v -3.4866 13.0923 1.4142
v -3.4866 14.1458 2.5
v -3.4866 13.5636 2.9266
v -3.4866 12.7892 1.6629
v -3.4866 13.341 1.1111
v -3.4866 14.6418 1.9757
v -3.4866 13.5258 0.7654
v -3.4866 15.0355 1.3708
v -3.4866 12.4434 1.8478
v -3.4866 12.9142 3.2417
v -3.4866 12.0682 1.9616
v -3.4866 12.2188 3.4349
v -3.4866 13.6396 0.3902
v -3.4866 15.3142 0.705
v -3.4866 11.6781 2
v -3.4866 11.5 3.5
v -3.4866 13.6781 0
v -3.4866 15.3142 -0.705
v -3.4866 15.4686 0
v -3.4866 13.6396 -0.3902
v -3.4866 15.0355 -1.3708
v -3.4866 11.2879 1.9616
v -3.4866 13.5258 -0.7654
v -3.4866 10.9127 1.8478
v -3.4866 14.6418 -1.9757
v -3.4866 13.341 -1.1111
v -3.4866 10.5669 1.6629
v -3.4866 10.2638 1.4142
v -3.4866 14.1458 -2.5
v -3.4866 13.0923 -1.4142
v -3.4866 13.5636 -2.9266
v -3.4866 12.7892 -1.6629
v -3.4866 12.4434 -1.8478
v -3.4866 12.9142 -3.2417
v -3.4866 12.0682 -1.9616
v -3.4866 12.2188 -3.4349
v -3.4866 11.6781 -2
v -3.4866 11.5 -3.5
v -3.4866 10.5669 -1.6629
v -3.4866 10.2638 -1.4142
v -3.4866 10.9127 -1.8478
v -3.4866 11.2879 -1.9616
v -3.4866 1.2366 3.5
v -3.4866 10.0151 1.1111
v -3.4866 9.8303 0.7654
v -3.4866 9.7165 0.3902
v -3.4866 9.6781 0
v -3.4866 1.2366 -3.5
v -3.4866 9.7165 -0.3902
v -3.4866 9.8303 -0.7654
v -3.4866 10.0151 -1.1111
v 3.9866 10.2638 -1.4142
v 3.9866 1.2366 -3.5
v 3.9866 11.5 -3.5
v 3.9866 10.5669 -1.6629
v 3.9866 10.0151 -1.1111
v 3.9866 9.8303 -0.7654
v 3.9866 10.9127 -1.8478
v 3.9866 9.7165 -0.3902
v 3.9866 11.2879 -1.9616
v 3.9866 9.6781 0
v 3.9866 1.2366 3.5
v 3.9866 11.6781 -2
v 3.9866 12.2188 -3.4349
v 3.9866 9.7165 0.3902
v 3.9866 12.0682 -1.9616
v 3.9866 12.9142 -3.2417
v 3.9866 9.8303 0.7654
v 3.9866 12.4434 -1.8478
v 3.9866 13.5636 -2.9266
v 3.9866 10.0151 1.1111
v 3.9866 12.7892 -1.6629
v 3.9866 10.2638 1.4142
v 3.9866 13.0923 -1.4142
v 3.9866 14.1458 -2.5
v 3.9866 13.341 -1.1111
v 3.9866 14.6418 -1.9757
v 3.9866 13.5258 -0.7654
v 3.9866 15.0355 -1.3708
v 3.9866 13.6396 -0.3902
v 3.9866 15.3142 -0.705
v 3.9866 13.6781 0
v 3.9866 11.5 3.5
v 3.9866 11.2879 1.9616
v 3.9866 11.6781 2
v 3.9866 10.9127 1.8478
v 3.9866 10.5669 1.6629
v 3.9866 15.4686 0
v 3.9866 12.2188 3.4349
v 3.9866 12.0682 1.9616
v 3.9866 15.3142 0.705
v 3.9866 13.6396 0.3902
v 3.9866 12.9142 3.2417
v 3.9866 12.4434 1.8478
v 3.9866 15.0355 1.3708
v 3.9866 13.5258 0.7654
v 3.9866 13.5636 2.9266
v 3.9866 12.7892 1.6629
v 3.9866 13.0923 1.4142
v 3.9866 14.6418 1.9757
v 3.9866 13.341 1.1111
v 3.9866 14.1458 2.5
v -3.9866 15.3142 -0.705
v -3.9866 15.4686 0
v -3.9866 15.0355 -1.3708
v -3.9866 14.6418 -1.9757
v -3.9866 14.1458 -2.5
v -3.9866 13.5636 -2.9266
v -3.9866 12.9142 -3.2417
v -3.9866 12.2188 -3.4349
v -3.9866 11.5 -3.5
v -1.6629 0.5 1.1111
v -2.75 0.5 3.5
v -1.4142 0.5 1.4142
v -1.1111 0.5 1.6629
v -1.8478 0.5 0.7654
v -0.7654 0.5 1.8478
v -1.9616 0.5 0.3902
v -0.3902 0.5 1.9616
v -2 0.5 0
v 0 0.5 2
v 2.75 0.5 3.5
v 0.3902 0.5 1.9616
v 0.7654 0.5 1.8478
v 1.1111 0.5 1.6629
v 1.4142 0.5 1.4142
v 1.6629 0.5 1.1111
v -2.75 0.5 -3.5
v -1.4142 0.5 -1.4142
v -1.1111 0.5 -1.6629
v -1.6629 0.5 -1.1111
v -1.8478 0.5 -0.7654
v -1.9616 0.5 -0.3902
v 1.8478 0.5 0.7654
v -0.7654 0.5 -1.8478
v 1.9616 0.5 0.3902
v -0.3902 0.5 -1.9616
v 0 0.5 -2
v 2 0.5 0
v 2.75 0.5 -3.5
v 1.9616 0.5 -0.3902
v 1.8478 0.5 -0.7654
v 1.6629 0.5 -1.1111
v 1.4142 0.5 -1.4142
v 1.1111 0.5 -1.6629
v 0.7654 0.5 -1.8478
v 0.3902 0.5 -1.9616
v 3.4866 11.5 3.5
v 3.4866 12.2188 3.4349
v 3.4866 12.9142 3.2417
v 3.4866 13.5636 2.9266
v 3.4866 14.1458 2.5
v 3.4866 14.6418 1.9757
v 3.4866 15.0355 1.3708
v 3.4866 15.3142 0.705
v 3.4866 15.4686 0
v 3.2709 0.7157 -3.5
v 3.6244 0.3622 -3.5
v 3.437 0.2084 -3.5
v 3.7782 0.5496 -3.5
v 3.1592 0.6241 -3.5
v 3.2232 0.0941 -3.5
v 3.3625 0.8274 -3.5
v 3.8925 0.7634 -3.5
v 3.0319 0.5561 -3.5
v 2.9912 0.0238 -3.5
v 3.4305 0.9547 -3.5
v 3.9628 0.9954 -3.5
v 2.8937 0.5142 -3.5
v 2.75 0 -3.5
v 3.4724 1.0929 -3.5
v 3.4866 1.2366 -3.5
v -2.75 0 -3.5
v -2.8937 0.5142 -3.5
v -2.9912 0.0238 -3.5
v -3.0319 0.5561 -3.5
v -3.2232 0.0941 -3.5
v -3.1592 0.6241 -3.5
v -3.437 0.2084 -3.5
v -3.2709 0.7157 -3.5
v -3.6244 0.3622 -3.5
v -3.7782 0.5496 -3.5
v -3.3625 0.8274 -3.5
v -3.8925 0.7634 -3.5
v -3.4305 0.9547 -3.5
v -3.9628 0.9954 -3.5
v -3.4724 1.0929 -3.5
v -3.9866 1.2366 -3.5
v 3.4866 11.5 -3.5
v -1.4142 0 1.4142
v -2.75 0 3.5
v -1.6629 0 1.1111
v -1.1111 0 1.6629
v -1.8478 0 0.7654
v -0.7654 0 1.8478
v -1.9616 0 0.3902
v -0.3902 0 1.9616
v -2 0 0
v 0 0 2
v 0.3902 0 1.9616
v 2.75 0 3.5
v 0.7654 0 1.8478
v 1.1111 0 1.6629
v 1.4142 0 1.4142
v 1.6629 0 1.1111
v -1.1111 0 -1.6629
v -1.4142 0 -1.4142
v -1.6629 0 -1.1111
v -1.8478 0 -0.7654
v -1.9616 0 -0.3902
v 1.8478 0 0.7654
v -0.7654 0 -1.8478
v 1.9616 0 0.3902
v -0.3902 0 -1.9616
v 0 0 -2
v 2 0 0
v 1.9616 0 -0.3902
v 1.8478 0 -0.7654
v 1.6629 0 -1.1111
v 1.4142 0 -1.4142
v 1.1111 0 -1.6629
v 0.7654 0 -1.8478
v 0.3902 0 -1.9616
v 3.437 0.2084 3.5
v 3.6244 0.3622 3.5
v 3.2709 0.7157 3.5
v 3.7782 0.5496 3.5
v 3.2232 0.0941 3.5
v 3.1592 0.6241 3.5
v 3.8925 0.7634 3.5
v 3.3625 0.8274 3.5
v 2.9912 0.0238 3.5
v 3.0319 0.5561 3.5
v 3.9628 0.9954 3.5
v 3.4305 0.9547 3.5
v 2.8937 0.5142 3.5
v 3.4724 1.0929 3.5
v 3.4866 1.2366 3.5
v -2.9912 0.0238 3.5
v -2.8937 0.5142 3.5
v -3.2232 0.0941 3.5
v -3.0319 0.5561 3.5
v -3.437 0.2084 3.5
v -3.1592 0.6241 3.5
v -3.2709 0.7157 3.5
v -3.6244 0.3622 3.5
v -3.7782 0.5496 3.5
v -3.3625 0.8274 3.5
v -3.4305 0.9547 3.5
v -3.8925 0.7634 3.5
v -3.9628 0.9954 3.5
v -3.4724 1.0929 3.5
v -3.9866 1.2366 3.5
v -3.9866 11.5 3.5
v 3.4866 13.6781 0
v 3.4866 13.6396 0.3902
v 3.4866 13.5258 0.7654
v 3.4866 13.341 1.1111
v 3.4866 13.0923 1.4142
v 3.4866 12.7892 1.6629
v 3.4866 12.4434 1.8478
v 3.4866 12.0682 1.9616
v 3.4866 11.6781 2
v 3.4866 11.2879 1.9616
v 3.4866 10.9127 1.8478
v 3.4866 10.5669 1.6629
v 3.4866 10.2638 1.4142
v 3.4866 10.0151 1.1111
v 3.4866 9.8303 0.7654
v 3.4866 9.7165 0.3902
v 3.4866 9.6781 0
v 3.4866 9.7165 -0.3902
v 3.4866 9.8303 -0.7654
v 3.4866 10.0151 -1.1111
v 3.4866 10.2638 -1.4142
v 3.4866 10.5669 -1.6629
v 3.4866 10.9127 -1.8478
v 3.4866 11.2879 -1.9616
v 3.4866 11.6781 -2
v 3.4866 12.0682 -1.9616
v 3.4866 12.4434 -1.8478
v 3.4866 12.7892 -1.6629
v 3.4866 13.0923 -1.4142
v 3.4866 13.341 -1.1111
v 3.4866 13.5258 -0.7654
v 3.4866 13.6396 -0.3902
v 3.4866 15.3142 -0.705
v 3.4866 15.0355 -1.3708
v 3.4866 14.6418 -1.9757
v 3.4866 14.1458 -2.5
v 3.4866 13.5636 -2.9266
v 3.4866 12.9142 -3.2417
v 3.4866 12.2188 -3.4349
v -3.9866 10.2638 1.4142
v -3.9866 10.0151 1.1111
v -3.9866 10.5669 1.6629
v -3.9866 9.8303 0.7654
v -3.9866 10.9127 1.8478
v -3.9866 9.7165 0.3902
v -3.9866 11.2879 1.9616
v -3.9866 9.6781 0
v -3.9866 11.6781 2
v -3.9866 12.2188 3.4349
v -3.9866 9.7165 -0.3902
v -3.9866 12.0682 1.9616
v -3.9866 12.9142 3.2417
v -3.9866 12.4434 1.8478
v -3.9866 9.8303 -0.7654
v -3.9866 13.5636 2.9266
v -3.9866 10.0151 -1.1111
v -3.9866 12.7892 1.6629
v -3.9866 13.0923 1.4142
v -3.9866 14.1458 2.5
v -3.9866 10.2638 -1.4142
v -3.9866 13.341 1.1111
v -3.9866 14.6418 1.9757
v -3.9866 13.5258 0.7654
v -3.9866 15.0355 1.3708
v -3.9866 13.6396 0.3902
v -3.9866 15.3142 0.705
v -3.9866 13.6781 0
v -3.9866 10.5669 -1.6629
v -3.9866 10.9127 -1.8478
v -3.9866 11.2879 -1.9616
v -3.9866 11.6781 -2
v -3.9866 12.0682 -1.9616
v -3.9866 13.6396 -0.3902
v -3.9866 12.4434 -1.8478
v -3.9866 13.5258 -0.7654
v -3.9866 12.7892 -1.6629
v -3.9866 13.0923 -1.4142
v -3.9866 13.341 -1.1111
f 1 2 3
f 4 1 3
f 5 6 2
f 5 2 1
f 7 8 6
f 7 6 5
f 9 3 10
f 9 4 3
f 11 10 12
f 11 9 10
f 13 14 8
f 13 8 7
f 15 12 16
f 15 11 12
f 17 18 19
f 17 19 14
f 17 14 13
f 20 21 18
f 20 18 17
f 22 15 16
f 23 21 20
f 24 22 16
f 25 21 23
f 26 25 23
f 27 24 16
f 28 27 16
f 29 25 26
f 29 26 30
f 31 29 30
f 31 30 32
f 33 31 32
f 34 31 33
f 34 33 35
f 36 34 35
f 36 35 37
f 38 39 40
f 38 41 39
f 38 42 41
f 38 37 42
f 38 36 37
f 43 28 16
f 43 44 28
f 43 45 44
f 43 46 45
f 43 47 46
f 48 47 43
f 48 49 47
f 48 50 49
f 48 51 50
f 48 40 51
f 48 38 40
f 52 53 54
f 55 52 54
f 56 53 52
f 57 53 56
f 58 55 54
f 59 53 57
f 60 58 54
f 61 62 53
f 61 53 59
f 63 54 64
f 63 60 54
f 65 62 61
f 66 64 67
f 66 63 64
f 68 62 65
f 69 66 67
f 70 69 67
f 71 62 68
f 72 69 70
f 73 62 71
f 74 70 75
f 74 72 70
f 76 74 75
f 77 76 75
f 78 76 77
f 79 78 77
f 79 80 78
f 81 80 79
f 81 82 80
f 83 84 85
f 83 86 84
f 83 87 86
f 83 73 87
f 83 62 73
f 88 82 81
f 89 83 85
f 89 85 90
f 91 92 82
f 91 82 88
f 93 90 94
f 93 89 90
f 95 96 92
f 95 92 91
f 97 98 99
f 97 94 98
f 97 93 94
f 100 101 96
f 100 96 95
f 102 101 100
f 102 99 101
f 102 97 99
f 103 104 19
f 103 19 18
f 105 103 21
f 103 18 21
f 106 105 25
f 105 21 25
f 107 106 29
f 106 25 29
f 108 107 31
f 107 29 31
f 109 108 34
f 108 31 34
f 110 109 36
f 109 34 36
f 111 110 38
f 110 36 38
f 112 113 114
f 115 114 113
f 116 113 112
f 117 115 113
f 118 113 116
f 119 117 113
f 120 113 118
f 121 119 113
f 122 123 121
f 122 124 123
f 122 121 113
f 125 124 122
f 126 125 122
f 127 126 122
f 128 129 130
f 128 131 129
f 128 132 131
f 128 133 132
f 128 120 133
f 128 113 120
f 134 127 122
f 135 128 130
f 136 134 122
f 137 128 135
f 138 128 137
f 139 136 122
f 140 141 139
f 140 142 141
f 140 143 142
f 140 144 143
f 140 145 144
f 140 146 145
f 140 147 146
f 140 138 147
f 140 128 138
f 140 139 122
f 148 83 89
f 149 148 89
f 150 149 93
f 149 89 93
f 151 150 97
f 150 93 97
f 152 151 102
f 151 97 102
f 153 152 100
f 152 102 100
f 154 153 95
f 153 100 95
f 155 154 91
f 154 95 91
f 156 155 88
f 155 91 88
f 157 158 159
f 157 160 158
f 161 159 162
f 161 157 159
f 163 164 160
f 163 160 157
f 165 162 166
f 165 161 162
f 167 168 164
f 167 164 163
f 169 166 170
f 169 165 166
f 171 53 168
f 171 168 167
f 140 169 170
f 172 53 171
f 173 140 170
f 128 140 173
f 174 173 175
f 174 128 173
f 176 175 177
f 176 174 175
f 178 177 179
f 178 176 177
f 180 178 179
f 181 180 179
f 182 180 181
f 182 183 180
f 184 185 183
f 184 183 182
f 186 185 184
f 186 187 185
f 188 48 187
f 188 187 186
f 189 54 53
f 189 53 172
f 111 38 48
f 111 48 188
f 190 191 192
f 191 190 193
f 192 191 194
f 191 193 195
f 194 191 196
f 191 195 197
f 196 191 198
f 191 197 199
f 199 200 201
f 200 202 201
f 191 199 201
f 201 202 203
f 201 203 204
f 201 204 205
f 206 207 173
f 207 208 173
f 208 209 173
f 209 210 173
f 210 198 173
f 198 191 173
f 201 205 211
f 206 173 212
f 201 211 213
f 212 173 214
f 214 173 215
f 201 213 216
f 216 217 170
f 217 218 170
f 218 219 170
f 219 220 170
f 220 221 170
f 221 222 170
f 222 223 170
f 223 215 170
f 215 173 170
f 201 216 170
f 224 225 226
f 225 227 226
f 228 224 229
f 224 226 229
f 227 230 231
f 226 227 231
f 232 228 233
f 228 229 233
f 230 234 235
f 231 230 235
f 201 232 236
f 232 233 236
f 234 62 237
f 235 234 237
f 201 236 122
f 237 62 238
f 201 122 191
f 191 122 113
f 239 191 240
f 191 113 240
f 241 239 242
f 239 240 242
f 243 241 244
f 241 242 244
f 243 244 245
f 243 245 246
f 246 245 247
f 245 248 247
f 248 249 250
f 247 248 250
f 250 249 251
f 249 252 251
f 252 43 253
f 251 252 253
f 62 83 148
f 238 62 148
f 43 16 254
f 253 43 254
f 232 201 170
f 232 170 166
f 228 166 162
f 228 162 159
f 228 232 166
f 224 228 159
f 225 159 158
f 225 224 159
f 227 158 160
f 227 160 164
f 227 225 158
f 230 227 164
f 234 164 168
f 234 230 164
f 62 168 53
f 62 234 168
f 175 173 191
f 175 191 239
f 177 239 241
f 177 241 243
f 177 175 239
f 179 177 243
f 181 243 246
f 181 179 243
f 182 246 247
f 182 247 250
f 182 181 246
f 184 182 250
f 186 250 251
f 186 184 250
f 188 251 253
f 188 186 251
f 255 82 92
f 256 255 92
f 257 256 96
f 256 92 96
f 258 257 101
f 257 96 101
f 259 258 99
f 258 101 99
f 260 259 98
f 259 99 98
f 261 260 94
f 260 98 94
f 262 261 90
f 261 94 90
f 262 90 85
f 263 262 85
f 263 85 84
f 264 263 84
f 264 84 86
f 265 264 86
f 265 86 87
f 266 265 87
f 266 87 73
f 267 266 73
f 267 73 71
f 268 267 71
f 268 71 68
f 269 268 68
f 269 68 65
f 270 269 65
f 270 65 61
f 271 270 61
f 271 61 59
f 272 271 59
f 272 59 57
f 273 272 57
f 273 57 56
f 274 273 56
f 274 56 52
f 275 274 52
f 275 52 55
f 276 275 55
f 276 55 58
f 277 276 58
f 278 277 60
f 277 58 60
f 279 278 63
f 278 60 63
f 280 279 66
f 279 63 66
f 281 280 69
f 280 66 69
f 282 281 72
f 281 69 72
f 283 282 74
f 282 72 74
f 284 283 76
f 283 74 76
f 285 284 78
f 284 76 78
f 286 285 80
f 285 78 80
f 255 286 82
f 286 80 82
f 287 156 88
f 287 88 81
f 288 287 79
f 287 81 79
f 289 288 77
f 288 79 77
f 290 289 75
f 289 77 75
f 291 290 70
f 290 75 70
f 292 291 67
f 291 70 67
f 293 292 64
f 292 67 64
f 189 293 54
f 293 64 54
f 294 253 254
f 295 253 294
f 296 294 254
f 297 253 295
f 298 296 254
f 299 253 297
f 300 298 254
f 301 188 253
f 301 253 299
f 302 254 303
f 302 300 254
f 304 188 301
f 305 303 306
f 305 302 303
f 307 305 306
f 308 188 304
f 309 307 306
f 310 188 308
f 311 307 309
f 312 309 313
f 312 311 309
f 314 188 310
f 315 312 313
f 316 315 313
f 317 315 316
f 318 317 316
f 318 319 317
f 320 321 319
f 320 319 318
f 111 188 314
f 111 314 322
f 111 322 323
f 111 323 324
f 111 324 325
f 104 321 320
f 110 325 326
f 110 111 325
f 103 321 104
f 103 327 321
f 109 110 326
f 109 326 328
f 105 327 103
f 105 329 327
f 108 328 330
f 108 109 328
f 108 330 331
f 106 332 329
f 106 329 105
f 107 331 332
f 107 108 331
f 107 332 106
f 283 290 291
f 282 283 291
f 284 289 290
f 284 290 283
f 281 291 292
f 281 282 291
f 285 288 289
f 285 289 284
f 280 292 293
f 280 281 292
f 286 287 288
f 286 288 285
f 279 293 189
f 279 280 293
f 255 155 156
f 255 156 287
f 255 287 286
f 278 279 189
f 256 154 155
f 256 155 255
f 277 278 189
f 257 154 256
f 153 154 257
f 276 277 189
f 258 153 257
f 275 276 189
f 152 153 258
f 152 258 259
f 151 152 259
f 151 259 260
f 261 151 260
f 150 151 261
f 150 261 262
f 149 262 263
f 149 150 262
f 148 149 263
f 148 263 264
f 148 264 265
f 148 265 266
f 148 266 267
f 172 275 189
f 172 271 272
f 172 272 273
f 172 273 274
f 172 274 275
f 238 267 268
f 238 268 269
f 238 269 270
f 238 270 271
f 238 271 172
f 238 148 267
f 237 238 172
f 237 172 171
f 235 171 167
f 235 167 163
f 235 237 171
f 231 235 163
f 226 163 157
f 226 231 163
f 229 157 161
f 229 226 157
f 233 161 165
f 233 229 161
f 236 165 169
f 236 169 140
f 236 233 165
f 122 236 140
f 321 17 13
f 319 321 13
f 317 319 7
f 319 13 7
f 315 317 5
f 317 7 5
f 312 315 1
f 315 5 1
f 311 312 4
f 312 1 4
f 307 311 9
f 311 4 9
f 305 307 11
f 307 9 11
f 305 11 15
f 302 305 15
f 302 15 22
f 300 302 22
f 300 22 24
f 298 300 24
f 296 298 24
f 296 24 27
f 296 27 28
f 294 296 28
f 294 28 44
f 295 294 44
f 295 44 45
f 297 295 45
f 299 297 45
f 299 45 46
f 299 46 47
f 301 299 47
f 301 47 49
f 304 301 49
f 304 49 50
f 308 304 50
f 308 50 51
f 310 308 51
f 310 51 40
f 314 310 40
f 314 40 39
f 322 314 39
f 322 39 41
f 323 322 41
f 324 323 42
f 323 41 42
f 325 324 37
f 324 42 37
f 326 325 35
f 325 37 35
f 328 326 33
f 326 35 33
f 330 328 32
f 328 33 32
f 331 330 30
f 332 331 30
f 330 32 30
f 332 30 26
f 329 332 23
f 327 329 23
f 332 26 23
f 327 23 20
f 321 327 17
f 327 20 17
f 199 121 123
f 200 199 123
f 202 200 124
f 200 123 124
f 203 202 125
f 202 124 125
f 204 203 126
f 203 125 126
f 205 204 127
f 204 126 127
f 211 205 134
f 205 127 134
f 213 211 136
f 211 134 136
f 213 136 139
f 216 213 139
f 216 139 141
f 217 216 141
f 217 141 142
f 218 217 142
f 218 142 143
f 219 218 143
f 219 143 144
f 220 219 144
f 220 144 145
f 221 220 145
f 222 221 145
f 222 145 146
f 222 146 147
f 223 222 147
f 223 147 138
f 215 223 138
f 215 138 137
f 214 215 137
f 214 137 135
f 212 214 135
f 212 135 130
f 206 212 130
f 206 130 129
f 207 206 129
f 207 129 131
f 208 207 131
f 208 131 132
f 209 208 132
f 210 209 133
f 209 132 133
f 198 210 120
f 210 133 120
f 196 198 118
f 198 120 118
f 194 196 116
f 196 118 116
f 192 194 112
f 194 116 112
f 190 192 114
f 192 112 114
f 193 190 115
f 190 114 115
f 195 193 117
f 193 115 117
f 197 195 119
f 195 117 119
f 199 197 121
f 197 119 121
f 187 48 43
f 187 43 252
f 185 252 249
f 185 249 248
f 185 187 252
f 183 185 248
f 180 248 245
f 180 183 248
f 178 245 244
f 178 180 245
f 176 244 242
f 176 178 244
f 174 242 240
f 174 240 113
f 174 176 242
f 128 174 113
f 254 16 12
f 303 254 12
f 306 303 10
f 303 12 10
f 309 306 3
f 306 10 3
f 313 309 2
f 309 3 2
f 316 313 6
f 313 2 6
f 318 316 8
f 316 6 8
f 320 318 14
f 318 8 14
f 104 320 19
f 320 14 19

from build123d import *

# Parameters (mm, degrees)
SKETCH1_W          = 5.5
SKETCH1_H          = 7
BASE_FLANGE1_DEPTH = 0.5
EDGE_FLANGE1_DEPTH = 7
EDGE_FLANGE2_DEPTH = 7
FILLET1_R          = 4
SKETCH12_R         = 2
CUT_EXTRUDE1_DEPTH = 16.880893326
SKETCH13_R         = 2
CUT_EXTRUDE2_DEPTH = 18.75106584


# Sheet-metal steps are written as plain solids
with BuildPart() as part:
    # Sketch1 → Base-Flange1 (new body)
    with BuildSketch(Plane(origin=(0, 0, 0), x_dir=(1, 0, 0), z_dir=(0, 1, 0))):
        Rectangle(SKETCH1_W, SKETCH1_H)
    extrude(amount=BASE_FLANGE1_DEPTH)

    # Edge-Flange1 section (across the edge) → Edge-Flange1 (add)
    with BuildSketch(Plane(origin=(3.4866, 0.5, 3.5), x_dir=(-1, 0, 0), z_dir=(0, 0, -1))):
        with BuildLine():
            Line((-0.5, 0.7366), (-0.5, 15))
            Line((-0.5, 15), (0, 15))
            Line((0, 15), (0, 0.7366))
            ThreePointArc((0, 0.7366), (0.215745145, 0.215745145), (0.7366, 0))
            Line((0.7366, 0), (0.7366, -0.5))
            ThreePointArc((0.7366, -0.5), (-0.137808246, -0.137808246), (-0.5, 0.7366))
        make_face()
    extrude(amount=EDGE_FLANGE1_DEPTH)

    # Edge-Flange2 section (across the edge) → Edge-Flange2 (add)
    with BuildSketch(Plane(origin=(-3.4866, 0.5, -3.5), x_dir=(1, 0, 0), z_dir=(0, 0, 1))):
        with BuildLine():
            Line((-0.5, 0.7366), (-0.5, 15))
            Line((-0.5, 15), (0, 15))
            Line((0, 15), (0, 0.7366))
            ThreePointArc((0, 0.7366), (0.215745145, 0.215745145), (0.7366, 0))
            Line((0.7366, 0), (0.7366, -0.5))
            ThreePointArc((0.7366, -0.5), (-0.137808246, -0.137808246), (-0.5, 0.7366))
        make_face()
    extrude(amount=EDGE_FLANGE2_DEPTH)

    # Fillet1
    # the kernel refuses this fillet: 4 mm, written as the material it takes off along each edge
    with BuildSketch(Plane(origin=(13.9866, 15.5, -3.5), x_dir=(0, -1, 0), z_dir=(-1, 0, 0)), Plane(origin=(13.9866, 15.5, 3.5), x_dir=(0, 0, -1), z_dir=(-1, 0, 0))) as fillet1_piece_1:
        with BuildLine():
            CenterArc((FILLET1_R, FILLET1_R), FILLET1_R, 180, 90)
            Line((0, FILLET1_R), (0, 0))
            Line((0, 0), (FILLET1_R, 0))
        make_face()
    extrude(amount=20.5, mode=Mode.SUBTRACT)
    with BuildSketch(Plane(origin=(-13.9866, 15.5, -3.5), x_dir=(0, -1, 0), z_dir=(1, 0, 0)), Plane(origin=(-13.9866, 15.5, 3.5), x_dir=(0, 0, -1), z_dir=(1, 0, 0))) as fillet1_piece_2:
        with BuildLine():
            CenterArc((FILLET1_R, -FILLET1_R), FILLET1_R, 90, 90)
            Line((0, -FILLET1_R), (0, 0))
            Line((0, 0), (FILLET1_R, 0))
        make_face()
    extrude(amount=20.5, mode=Mode.SUBTRACT)

    # Sketch12 → Cut-Extrude1 (cut, through all)
    with BuildSketch(Plane(origin=(0, 0.5, 0), x_dir=(1, 0, 0), z_dir=(0, 1, 0))):
        with Locations(Location((0, 0, 0), (0, 0, 270))):
            Circle(SKETCH12_R)
    extrude(amount=-CUT_EXTRUDE1_DEPTH, mode=Mode.SUBTRACT)

    # Sketch13 → Cut-Extrude2 (cut, through all)
    with BuildSketch(Plane(origin=(3.9866, 0, 0), x_dir=(0, 0, -1), z_dir=(1, 0, 0))):
        with Locations(Location((0, 11.678062377, 0), (0, 0, 90))):
            Circle(SKETCH13_R)
    extrude(amount=-CUT_EXTRUDE2_DEPTH, mode=Mode.SUBTRACT)


solid = part.part
